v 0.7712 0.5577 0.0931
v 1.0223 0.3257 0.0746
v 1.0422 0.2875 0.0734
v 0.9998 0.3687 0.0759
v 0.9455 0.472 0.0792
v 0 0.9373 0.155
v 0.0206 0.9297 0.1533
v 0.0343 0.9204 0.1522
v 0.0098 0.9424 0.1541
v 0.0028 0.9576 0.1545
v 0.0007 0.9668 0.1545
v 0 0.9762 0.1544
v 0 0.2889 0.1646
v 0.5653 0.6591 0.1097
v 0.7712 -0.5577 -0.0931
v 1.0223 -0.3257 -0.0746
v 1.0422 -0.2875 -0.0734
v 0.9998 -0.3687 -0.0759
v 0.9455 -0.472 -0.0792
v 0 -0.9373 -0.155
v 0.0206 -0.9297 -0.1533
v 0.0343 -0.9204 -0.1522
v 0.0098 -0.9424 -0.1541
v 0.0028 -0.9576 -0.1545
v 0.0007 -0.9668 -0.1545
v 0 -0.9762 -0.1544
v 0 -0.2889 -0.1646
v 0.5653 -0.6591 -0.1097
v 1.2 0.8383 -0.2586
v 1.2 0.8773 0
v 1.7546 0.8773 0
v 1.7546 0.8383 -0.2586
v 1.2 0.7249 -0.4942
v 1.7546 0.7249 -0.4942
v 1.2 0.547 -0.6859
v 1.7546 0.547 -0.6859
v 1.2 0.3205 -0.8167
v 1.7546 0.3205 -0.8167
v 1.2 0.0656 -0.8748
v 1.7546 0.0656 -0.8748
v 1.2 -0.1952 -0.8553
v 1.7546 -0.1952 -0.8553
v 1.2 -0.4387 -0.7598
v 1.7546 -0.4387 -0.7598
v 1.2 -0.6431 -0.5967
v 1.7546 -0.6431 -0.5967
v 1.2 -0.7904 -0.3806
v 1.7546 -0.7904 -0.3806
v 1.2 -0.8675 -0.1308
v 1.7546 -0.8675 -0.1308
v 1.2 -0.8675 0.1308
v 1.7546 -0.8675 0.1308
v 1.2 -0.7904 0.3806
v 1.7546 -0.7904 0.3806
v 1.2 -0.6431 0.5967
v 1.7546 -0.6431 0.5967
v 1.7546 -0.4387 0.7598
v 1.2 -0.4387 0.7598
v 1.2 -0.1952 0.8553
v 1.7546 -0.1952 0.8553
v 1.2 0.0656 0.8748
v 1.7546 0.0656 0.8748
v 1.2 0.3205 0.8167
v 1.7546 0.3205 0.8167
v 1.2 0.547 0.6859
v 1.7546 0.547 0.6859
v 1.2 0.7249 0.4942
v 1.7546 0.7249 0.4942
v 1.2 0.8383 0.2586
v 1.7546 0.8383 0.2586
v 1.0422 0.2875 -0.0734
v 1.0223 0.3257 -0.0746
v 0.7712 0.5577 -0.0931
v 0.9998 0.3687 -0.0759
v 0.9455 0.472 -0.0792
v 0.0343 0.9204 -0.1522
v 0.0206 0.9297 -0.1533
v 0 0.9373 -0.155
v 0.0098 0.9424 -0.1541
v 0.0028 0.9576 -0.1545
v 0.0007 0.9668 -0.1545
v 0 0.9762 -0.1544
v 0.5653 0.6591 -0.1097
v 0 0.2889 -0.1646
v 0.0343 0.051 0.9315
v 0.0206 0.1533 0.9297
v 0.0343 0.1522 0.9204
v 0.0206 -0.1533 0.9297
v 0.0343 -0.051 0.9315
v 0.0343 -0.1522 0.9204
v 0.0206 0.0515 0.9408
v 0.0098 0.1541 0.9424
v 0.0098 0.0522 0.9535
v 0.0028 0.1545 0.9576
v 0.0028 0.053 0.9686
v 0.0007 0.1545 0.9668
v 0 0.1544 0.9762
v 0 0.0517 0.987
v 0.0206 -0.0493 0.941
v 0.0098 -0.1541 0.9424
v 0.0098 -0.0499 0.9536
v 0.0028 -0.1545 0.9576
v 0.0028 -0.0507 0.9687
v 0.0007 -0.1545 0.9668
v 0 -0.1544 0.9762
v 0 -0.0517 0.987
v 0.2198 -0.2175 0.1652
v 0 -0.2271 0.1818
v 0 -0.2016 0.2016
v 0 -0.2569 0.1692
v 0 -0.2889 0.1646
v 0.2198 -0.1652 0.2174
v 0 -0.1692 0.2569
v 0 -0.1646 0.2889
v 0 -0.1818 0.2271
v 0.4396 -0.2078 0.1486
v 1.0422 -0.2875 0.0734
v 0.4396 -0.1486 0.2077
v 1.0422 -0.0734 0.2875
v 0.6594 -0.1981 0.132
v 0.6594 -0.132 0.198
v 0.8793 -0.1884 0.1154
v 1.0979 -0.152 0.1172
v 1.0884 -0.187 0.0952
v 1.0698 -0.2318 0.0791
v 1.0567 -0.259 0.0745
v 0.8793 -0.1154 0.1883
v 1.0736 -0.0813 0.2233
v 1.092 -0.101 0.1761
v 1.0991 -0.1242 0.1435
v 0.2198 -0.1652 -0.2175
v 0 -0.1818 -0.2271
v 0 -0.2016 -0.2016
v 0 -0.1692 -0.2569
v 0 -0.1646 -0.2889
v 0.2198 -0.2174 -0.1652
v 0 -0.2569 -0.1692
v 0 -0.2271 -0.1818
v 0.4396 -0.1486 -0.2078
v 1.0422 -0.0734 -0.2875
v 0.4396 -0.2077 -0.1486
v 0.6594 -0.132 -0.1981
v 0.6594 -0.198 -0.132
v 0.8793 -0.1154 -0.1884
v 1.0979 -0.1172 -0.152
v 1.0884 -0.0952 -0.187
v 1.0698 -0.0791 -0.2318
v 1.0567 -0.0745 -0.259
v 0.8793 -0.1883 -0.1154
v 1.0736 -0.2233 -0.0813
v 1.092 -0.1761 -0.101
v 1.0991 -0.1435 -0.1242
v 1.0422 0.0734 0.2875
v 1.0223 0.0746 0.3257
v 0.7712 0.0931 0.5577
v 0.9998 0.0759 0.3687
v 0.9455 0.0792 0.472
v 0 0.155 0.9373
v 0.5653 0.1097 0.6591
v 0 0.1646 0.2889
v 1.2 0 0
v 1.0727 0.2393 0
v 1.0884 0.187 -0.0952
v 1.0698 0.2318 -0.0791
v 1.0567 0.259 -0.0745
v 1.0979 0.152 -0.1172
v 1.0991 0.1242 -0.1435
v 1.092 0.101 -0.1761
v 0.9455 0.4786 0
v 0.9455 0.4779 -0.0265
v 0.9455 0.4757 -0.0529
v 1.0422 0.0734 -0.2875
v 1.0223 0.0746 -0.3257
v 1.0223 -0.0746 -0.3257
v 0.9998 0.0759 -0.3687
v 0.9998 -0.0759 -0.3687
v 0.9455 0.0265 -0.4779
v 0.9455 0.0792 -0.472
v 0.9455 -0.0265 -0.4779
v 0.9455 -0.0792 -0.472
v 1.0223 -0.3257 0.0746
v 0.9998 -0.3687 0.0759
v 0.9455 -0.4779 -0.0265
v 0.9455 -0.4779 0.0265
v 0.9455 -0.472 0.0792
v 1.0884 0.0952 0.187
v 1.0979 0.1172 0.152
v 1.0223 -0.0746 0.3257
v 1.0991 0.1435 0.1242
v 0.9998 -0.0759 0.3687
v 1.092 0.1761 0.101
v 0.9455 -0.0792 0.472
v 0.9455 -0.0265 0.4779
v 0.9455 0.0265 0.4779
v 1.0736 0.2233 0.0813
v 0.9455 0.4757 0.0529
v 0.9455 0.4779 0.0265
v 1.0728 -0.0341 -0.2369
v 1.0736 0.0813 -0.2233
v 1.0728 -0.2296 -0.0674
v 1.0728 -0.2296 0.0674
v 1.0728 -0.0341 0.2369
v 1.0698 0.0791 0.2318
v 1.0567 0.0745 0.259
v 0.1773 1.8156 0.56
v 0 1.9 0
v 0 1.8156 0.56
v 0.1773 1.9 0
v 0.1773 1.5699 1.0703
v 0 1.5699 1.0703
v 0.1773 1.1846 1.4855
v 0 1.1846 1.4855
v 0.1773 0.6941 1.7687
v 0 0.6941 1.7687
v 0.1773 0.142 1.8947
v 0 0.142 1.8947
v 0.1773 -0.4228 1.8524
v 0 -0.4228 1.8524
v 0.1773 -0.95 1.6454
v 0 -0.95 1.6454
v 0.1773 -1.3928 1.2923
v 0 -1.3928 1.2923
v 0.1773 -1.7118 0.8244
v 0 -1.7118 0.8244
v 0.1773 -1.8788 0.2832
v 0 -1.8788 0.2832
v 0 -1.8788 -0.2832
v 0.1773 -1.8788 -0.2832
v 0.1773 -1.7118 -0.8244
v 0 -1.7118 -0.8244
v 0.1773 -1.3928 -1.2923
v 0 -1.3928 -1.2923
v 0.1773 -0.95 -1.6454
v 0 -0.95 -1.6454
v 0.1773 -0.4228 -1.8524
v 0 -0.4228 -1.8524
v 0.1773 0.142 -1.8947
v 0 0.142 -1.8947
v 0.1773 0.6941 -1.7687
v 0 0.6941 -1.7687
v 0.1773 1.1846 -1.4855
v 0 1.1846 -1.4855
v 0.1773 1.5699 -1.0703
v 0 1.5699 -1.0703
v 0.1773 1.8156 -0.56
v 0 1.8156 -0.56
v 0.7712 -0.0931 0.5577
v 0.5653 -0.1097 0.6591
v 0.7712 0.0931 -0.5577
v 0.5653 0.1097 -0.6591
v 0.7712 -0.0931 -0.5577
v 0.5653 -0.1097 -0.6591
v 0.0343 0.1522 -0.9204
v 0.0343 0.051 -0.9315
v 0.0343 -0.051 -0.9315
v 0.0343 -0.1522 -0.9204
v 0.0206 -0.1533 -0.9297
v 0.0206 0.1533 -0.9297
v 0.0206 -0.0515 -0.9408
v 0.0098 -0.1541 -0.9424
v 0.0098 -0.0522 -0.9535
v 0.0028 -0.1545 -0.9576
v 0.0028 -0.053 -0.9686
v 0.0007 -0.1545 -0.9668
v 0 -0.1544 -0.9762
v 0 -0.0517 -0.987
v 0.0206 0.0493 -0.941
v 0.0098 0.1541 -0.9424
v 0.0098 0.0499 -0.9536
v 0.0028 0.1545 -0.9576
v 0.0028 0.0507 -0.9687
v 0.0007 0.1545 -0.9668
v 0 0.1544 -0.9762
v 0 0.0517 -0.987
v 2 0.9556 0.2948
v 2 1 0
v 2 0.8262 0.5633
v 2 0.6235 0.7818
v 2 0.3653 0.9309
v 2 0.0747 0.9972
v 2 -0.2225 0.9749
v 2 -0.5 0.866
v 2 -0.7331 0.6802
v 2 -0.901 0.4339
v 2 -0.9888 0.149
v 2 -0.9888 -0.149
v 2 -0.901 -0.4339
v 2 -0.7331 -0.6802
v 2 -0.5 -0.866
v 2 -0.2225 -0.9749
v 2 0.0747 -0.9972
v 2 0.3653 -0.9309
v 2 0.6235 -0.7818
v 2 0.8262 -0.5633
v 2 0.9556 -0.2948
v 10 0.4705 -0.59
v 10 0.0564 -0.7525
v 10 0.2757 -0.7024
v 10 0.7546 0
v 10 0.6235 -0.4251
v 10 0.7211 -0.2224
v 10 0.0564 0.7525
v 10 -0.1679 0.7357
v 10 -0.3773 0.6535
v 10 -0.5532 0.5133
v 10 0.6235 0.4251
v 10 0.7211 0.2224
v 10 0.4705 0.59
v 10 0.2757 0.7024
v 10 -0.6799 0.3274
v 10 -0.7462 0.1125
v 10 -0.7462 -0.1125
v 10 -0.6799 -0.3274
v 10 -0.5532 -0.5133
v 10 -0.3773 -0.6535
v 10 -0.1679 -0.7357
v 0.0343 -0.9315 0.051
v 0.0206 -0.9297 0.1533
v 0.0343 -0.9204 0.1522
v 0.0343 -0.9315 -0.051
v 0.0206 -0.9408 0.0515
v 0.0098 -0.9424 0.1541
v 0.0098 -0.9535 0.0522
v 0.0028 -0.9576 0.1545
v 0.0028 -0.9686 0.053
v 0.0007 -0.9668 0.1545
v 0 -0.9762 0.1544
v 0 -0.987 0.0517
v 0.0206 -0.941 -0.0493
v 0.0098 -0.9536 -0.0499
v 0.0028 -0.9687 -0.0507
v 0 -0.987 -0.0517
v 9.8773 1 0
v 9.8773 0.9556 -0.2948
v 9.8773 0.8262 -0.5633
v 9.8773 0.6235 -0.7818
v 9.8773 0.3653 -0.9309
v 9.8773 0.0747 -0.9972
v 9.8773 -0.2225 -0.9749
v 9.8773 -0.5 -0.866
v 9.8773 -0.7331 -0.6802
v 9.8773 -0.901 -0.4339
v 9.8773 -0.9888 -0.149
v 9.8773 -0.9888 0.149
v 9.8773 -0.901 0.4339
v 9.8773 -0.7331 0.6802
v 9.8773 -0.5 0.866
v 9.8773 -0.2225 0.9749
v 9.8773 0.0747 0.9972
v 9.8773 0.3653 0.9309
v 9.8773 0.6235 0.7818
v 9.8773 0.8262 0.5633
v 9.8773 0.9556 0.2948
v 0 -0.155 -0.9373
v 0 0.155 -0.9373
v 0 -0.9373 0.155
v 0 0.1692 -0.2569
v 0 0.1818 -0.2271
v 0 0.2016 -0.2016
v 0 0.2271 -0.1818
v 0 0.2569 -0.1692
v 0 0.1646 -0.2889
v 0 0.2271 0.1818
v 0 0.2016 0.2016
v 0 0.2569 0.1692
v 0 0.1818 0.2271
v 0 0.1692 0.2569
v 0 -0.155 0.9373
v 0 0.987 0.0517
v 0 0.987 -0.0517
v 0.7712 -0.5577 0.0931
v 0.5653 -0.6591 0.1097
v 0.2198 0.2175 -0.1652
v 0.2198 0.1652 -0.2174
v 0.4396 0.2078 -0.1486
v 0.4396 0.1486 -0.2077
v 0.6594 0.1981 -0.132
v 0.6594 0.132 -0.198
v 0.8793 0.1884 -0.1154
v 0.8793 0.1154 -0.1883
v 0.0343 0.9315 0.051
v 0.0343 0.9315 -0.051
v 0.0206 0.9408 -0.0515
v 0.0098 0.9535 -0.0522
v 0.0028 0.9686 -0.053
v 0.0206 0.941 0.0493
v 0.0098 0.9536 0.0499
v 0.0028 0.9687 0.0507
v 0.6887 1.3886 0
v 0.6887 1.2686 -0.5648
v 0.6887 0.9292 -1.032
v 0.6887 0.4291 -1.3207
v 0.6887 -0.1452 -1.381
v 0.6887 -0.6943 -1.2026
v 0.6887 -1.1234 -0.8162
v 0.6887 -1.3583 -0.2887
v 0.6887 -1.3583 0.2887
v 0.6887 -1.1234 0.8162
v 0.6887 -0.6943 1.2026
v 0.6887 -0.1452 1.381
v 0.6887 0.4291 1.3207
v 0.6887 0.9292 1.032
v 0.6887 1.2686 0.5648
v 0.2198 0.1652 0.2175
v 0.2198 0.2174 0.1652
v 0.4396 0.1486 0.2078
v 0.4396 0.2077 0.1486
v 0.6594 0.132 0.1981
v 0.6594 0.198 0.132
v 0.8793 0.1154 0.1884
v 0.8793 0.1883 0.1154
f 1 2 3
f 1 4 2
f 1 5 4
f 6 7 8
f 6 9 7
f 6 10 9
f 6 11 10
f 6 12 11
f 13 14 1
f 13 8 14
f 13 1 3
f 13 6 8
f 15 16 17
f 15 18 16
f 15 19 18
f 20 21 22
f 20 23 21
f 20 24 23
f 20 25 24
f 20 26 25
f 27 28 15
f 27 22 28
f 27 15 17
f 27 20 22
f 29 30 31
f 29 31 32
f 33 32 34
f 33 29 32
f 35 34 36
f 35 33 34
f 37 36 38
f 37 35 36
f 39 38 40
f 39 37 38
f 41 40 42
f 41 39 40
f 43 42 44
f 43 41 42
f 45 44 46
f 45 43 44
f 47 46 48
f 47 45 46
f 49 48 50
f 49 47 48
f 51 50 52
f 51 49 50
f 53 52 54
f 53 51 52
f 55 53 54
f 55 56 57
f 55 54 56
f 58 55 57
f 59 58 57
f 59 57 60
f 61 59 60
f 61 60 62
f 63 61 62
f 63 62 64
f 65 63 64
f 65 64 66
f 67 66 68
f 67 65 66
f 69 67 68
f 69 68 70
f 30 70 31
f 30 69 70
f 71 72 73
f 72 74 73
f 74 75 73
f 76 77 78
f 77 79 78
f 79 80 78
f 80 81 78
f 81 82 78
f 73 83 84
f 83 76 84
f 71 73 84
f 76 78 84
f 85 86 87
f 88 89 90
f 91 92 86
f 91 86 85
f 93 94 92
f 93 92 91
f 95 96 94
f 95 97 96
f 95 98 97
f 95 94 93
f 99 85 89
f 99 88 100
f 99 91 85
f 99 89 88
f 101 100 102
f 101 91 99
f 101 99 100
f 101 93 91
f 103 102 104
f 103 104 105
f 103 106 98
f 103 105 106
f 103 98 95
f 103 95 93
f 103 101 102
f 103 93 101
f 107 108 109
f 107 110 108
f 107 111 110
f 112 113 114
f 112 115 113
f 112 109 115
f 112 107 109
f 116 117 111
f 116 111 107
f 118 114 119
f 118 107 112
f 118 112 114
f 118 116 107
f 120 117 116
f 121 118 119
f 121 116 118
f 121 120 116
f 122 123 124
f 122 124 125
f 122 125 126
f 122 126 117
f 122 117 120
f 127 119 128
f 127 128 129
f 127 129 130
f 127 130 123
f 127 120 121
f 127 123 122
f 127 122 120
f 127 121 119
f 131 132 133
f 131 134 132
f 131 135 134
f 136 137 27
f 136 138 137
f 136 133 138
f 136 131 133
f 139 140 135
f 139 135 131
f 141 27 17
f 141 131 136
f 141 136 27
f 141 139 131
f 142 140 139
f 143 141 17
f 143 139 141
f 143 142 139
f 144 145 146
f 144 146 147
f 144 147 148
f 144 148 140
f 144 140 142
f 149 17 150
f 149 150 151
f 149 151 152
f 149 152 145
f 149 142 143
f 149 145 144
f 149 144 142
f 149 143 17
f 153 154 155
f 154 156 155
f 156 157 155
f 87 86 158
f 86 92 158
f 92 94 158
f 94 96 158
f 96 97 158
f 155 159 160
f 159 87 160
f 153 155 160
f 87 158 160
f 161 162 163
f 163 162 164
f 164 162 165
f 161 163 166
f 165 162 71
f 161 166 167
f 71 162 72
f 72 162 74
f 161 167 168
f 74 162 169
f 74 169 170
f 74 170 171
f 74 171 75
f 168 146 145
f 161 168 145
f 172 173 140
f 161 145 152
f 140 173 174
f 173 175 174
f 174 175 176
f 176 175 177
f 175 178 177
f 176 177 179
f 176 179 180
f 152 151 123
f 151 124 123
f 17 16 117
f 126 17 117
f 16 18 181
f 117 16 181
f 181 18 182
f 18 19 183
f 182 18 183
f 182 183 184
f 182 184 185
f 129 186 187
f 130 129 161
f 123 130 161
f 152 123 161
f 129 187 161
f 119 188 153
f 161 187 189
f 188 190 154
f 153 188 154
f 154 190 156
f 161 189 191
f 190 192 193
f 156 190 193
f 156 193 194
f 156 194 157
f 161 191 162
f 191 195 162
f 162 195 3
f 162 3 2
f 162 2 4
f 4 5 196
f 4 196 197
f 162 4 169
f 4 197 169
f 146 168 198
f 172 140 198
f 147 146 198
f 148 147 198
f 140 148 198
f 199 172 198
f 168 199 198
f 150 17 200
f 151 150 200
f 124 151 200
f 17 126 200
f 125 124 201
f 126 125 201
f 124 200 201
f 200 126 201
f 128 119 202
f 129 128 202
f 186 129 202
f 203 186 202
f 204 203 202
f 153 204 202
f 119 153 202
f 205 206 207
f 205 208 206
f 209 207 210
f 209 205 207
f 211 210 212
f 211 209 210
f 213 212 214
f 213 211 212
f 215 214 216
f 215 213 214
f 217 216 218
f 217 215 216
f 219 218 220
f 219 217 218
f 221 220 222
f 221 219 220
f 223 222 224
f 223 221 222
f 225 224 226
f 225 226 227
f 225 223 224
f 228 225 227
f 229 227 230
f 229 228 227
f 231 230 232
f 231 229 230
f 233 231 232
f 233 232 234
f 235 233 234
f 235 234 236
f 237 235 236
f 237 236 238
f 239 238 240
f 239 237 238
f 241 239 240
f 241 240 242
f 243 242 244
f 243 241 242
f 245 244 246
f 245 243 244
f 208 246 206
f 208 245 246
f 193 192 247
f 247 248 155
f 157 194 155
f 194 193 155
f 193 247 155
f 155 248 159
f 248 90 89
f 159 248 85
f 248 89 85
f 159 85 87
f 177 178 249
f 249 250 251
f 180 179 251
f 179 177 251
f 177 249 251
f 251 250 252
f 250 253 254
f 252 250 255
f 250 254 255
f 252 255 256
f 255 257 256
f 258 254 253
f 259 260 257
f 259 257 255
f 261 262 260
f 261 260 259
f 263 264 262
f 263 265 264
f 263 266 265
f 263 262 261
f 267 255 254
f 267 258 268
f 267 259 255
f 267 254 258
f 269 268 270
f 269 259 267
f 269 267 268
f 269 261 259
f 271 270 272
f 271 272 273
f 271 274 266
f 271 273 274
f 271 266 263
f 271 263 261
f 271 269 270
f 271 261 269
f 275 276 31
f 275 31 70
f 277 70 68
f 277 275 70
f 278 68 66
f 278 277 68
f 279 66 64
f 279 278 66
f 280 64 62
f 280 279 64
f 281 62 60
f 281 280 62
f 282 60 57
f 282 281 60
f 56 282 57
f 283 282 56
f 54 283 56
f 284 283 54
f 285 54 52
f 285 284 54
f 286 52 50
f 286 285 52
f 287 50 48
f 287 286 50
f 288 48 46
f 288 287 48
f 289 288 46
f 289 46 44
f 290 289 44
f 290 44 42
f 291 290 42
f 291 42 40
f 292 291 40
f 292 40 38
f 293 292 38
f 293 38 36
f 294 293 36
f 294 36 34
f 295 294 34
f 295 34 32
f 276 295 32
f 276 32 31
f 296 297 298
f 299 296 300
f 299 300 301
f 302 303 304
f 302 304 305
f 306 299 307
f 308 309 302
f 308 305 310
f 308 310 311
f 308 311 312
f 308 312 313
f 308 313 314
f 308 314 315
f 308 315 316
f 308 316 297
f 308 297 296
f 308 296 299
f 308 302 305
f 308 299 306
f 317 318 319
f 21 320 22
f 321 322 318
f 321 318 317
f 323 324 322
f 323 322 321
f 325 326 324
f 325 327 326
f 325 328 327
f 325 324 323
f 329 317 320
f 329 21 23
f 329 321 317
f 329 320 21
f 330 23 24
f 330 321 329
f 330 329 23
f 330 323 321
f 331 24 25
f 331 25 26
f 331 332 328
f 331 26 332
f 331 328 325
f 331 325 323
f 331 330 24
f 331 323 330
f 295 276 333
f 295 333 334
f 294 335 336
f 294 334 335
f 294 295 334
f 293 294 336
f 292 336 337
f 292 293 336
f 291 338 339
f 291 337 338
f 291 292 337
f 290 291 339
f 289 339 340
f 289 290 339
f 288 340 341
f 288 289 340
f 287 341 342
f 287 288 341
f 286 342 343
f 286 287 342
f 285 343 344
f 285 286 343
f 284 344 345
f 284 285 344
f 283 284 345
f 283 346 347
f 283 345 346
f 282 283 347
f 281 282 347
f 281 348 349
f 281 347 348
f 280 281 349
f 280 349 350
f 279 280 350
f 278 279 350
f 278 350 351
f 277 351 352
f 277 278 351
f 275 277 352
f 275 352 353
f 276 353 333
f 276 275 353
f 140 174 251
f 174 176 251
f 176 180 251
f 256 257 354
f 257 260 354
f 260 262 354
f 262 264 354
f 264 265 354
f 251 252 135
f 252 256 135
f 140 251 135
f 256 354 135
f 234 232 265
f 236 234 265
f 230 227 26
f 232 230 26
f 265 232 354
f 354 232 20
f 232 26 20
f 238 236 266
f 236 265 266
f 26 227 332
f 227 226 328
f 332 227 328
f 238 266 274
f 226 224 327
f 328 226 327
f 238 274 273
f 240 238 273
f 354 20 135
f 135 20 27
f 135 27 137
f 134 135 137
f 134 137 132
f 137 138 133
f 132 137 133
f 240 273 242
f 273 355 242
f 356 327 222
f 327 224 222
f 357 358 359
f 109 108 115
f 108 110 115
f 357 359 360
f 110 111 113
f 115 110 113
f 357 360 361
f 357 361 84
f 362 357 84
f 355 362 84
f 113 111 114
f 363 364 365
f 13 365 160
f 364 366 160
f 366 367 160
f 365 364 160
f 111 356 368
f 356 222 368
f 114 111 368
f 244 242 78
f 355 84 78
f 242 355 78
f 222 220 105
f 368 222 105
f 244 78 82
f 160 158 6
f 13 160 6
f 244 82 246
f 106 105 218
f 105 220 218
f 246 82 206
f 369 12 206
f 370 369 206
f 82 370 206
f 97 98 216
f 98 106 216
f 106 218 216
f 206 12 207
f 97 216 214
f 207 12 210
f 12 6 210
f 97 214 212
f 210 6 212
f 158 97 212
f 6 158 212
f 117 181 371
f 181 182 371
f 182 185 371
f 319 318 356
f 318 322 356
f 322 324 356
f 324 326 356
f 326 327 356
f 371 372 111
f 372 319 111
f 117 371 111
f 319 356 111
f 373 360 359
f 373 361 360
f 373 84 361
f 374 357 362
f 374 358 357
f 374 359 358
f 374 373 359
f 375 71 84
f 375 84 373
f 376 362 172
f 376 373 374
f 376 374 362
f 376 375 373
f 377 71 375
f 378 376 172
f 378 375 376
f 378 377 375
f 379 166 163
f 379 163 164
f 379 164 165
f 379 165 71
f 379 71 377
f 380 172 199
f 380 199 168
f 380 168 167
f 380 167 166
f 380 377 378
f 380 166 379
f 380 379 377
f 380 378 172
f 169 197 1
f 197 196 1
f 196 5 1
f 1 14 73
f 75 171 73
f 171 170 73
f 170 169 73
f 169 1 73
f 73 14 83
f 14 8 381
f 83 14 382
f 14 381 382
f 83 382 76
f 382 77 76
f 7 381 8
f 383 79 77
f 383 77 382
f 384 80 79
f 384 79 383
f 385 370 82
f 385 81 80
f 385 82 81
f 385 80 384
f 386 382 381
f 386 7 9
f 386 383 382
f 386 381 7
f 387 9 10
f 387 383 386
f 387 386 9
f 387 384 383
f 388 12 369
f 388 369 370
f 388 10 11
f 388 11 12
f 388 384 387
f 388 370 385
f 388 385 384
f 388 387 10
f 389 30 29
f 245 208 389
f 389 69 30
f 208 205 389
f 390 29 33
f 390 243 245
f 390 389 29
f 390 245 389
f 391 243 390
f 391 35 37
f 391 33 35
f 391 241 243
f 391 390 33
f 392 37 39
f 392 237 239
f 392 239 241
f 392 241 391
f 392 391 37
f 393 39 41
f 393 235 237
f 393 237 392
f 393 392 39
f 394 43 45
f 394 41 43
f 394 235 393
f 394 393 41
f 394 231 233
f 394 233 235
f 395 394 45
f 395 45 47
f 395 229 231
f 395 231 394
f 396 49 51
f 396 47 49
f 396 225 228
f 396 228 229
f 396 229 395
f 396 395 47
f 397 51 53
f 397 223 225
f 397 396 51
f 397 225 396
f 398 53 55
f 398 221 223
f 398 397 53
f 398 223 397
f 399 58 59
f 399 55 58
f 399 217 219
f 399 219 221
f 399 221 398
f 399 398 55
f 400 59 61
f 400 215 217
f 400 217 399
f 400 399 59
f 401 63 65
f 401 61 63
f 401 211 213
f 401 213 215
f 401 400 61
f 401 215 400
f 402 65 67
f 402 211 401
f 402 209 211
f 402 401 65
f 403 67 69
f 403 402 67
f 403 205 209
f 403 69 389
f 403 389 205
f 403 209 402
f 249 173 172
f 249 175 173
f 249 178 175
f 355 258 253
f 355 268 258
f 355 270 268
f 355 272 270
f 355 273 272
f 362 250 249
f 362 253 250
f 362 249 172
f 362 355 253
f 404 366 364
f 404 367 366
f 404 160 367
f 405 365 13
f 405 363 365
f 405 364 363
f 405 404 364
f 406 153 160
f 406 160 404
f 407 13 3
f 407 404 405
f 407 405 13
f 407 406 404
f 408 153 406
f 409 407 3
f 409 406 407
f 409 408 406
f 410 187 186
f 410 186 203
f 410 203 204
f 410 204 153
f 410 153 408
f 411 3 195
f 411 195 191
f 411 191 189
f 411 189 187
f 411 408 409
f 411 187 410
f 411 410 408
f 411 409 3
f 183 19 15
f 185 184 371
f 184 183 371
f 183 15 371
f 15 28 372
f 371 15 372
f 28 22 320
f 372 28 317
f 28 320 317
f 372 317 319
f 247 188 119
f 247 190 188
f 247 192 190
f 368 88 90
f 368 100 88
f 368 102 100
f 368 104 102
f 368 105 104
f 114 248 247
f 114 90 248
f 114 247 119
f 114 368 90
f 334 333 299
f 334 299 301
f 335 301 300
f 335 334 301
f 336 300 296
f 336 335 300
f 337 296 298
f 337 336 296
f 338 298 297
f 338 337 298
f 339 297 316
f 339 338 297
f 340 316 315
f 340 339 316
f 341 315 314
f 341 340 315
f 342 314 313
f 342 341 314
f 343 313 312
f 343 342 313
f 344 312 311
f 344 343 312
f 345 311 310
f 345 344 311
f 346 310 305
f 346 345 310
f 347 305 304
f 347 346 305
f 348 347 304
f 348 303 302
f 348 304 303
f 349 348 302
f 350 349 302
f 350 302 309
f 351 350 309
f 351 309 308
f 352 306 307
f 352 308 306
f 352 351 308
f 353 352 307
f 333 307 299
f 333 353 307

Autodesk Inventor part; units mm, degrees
ref_plane "YZ Plane" through (0, 0, 0) normal (1, 0, 0) x (0, 1, 0)
ref_plane "XZ Plane" through (0, 0, 0) normal (0, 1, 0) x (-1, 0, 0)
sketch "Skizze1" plane through (0, 0, 0) normal (0, 0, 1) x (1, 0, 0)
  line L0 (1.2, 0) -> (10, 0)
  line L1 (10, 0) -> (10, 1)
  line L2 (10, 1) -> (2, 1)
  line L3 (2, 1) -> (1.7546, 0.8773)
  line L4 (1.7546, 0.8773) -> (1.2, 0.8773)
  line L5 (0, 1.9) -> (0, 0.95)
  line L6 (0, 0.95) -> (0.9455, 0.4786)
  line L7 (0.9455, 0.4786) -> (1.2, 0)
  line L8 (-2, 0) -> (12, 0) projected
  line L9 (0, -0.38) -> (0, 2.28) projected
  line L10 (0, 1.9) -> (0.1773, 1.9)
  line L11 (0.1773, 1.9) -> (1.2, 0.8773)
  line L12 (2, 1) -> (1.0773, 1) construction
  dimension "d1" = 8
  dimension "d2" = 2
  dimension "d3" = 1.7546
  dimension "d4" = 1.9
  dimension "d5" = 26.5
  dimension "d6" = 62
  dimension "d7" = 1.2
  dimension "d8" = 0.2454
  dimension "d12" = 3.8
  dimension "d13" = 45
  dimension "d15" = 10
  dimension "d24" = 1.2
revolve "Körper" add sketch "Skizze1" angle 360 about axis through (1.2, 0, 0) along (1, 0, 0) contours L7 L6 L5 L10 L11 L4 L3 L2 L1 L0
sketch "Skizze2" plane through (0, 0, 0) normal (-1, 0, 0) x (0, 0, 1)
  line L0 (0, 0.95) -> (0, 0) construction
  line L1 (0, 0) -> (0.95, 0) construction
  arc A0 (0.285, 0) -> (0, 0.285) centre (0, 0) ccw construction
  arc A1 (0.3325, 0) -> (0, 0.3325) centre (0, 0) ccw construction
  arc A2 (0.9373, 0.155) -> (0.155, 0.9373) centre (0, 0) ccw
  line L2 (0, 0) -> (0.6718, 0.6718) construction
  line L3 (0.155, 0.9373) -> (0.1646, 0.2889)
  line L4 (0.9373, 0.155) -> (0.2889, 0.1646)
  arc A3 (0.155, 0.9373) -> (0, 0.95) centre (0, 0) ccw
  arc A4 (0.95, 0) -> (0.9373, 0.155) centre (0, 0) ccw
  line L5 (0, -2.66) -> (0, 2.66) projected
  line L6 (-2.66, 0) -> (2.66, 0) projected
  arc A5 (0.155, -0.9373) -> (0.9373, -0.155) centre (0, 0) ccw
  line L7 (0.155, -0.9373) -> (0.1646, -0.2889)
  line L8 (0.9373, -0.155) -> (0.2889, -0.1646)
  arc A6 (0, -0.95) -> (0.155, -0.9373) centre (0, 0) ccw
  arc A7 (0.9373, -0.155) -> (0.95, 0) centre (0, 0) ccw
  arc A8 (-0.155, 0.9373) -> (-0.9373, 0.155) centre (0, 0) ccw
  line L9 (-0.155, 0.9373) -> (-0.1646, 0.2889)
  line L10 (-0.9373, 0.155) -> (-0.2889, 0.1646)
  arc A9 (0, 0.95) -> (-0.155, 0.9373) centre (0, 0) ccw
  arc A10 (-0.9373, 0.155) -> (-0.95, 0) centre (0, 0) ccw
  arc A11 (-0.155, -0.9373) -> (0, -0.95) centre (0, 0) ccw
  arc A12 (-0.9373, -0.155) -> (-0.155, -0.9373) centre (0, 0) ccw
  arc A13 (-0.95, 0) -> (-0.9373, -0.155) centre (0, 0) ccw
  line L11 (-0.9373, -0.155) -> (-0.2889, -0.1646)
  line L12 (-0.155, -0.9373) -> (-0.1646, -0.2889)
  arc A14 (0.1646, 0.2889) -> (0.2889, 0.1646) centre (0.2908, 0.2908) ccw
  arc A15 (0.2889, -0.1646) -> (0.1646, -0.2889) centre (0.2908, -0.2908) ccw
  arc A16 (-0.2889, 0.1646) -> (-0.1646, 0.2889) centre (-0.2908, 0.2908) ccw
  arc A17 (-0.1646, -0.2889) -> (-0.2889, -0.1646) centre (-0.2908, -0.2908) ccw
  point P0 (0.6718, -0.6718)
  point P1 (-0.6718, 0.6718)
  point P2 (-0.6718, -0.6718)
  dimension "d17" = 0.57
  dimension "d18" = 0.665
  dimension "d19" = 1.9
  dimension "d20" = 45
  dimension "d21" = 0.155
extrude "Loch" add sketch "Skizze2" against normal up to next draft 5 contours L4 A14 L3 A2 | A5 L7 A15 L8 | L9 A16 L10 A8 | A12 L11 A17 L12
fillet "Rundung1" radius 0.062 4 edges at (0, 0.95, 0) (0, 0, -0.95) (0, -0.95, 0) (0, 0, 0.95)
thread "Gewinde" size "M2x0.4" class "6g" standard "ISO Metric profile" length 8
chamfer "Fase1" distance 0.2454 distance2 0.1227 1 edges at (10, -1, 0) measured on face at (10, -0.0858, 0.7069)
ref_plane "Work Plane2" through (3.35, 0, 0) normal (0, 0, -1) x (1, 0, 0)
equation "\"d1\" = GEL"
equation "\"d2\" = GD"
equation "\"d3\" = BDM"
equation "\"d4\" = SDM"
equation "\"d7\" = INTI"
equation "\"d8\" = GAL"
equation "\"d12\" = KOD"
equation "\"d13\" = 0.5 * SEWI"
equation "\"d15\" = NLG"
equation "\"d24\" = KOH"
equation "\"d17\" = 0.3 * SDM"
equation "\"d18\" = 0.35 * SDM"
equation "\"d19\" = SDM"
equation "\"d21\" = 0.5 * SBR"
equation "\"d23\" = 0.2 * SBR"
equation "\"d10\" = GEL"
equation "\"d25\" = -0.5 * SPD + 0.5 * GD"
equation "\"d26\" = 0.5 * GAL"
equation "\"NLG\" = 10"
equation "\"GEL\" = 8"
equation "\"GAL\" = 0.61345 * PTC"
equation "\"SPD\" = NND - 1.2269 * PTC"
equation "\"KOD\" = 3.8"
equation "\"KOH\" = 1.2"
equation "\"SBR\" = 0.31"
equation "\"INTI\" = 1.2"
equation "\"SDM\" = 1.9"
equation "\"GD\" = NND"
equation "\"BDM\" = NND - GAL"
equation "\"SEWI\" = 90deg"
equation "\"d9\" = SDM"
equation "\"GUL\" = 0.61345 * PTC"
equation "\"TOA\" = 30deg"
equation "\"EPV\" = 2.2"
equation "\"THREADDIA\" = 2"
equation "\"PTC\" = 0.4"
equation "\"NND\" = 2"
equation "\"GD1\" = THREADDIA - 1.2269 * PTC"
properties part number "ISO 7046-1 - M2 x 10 - 4.8 - H" material "Stahl"
